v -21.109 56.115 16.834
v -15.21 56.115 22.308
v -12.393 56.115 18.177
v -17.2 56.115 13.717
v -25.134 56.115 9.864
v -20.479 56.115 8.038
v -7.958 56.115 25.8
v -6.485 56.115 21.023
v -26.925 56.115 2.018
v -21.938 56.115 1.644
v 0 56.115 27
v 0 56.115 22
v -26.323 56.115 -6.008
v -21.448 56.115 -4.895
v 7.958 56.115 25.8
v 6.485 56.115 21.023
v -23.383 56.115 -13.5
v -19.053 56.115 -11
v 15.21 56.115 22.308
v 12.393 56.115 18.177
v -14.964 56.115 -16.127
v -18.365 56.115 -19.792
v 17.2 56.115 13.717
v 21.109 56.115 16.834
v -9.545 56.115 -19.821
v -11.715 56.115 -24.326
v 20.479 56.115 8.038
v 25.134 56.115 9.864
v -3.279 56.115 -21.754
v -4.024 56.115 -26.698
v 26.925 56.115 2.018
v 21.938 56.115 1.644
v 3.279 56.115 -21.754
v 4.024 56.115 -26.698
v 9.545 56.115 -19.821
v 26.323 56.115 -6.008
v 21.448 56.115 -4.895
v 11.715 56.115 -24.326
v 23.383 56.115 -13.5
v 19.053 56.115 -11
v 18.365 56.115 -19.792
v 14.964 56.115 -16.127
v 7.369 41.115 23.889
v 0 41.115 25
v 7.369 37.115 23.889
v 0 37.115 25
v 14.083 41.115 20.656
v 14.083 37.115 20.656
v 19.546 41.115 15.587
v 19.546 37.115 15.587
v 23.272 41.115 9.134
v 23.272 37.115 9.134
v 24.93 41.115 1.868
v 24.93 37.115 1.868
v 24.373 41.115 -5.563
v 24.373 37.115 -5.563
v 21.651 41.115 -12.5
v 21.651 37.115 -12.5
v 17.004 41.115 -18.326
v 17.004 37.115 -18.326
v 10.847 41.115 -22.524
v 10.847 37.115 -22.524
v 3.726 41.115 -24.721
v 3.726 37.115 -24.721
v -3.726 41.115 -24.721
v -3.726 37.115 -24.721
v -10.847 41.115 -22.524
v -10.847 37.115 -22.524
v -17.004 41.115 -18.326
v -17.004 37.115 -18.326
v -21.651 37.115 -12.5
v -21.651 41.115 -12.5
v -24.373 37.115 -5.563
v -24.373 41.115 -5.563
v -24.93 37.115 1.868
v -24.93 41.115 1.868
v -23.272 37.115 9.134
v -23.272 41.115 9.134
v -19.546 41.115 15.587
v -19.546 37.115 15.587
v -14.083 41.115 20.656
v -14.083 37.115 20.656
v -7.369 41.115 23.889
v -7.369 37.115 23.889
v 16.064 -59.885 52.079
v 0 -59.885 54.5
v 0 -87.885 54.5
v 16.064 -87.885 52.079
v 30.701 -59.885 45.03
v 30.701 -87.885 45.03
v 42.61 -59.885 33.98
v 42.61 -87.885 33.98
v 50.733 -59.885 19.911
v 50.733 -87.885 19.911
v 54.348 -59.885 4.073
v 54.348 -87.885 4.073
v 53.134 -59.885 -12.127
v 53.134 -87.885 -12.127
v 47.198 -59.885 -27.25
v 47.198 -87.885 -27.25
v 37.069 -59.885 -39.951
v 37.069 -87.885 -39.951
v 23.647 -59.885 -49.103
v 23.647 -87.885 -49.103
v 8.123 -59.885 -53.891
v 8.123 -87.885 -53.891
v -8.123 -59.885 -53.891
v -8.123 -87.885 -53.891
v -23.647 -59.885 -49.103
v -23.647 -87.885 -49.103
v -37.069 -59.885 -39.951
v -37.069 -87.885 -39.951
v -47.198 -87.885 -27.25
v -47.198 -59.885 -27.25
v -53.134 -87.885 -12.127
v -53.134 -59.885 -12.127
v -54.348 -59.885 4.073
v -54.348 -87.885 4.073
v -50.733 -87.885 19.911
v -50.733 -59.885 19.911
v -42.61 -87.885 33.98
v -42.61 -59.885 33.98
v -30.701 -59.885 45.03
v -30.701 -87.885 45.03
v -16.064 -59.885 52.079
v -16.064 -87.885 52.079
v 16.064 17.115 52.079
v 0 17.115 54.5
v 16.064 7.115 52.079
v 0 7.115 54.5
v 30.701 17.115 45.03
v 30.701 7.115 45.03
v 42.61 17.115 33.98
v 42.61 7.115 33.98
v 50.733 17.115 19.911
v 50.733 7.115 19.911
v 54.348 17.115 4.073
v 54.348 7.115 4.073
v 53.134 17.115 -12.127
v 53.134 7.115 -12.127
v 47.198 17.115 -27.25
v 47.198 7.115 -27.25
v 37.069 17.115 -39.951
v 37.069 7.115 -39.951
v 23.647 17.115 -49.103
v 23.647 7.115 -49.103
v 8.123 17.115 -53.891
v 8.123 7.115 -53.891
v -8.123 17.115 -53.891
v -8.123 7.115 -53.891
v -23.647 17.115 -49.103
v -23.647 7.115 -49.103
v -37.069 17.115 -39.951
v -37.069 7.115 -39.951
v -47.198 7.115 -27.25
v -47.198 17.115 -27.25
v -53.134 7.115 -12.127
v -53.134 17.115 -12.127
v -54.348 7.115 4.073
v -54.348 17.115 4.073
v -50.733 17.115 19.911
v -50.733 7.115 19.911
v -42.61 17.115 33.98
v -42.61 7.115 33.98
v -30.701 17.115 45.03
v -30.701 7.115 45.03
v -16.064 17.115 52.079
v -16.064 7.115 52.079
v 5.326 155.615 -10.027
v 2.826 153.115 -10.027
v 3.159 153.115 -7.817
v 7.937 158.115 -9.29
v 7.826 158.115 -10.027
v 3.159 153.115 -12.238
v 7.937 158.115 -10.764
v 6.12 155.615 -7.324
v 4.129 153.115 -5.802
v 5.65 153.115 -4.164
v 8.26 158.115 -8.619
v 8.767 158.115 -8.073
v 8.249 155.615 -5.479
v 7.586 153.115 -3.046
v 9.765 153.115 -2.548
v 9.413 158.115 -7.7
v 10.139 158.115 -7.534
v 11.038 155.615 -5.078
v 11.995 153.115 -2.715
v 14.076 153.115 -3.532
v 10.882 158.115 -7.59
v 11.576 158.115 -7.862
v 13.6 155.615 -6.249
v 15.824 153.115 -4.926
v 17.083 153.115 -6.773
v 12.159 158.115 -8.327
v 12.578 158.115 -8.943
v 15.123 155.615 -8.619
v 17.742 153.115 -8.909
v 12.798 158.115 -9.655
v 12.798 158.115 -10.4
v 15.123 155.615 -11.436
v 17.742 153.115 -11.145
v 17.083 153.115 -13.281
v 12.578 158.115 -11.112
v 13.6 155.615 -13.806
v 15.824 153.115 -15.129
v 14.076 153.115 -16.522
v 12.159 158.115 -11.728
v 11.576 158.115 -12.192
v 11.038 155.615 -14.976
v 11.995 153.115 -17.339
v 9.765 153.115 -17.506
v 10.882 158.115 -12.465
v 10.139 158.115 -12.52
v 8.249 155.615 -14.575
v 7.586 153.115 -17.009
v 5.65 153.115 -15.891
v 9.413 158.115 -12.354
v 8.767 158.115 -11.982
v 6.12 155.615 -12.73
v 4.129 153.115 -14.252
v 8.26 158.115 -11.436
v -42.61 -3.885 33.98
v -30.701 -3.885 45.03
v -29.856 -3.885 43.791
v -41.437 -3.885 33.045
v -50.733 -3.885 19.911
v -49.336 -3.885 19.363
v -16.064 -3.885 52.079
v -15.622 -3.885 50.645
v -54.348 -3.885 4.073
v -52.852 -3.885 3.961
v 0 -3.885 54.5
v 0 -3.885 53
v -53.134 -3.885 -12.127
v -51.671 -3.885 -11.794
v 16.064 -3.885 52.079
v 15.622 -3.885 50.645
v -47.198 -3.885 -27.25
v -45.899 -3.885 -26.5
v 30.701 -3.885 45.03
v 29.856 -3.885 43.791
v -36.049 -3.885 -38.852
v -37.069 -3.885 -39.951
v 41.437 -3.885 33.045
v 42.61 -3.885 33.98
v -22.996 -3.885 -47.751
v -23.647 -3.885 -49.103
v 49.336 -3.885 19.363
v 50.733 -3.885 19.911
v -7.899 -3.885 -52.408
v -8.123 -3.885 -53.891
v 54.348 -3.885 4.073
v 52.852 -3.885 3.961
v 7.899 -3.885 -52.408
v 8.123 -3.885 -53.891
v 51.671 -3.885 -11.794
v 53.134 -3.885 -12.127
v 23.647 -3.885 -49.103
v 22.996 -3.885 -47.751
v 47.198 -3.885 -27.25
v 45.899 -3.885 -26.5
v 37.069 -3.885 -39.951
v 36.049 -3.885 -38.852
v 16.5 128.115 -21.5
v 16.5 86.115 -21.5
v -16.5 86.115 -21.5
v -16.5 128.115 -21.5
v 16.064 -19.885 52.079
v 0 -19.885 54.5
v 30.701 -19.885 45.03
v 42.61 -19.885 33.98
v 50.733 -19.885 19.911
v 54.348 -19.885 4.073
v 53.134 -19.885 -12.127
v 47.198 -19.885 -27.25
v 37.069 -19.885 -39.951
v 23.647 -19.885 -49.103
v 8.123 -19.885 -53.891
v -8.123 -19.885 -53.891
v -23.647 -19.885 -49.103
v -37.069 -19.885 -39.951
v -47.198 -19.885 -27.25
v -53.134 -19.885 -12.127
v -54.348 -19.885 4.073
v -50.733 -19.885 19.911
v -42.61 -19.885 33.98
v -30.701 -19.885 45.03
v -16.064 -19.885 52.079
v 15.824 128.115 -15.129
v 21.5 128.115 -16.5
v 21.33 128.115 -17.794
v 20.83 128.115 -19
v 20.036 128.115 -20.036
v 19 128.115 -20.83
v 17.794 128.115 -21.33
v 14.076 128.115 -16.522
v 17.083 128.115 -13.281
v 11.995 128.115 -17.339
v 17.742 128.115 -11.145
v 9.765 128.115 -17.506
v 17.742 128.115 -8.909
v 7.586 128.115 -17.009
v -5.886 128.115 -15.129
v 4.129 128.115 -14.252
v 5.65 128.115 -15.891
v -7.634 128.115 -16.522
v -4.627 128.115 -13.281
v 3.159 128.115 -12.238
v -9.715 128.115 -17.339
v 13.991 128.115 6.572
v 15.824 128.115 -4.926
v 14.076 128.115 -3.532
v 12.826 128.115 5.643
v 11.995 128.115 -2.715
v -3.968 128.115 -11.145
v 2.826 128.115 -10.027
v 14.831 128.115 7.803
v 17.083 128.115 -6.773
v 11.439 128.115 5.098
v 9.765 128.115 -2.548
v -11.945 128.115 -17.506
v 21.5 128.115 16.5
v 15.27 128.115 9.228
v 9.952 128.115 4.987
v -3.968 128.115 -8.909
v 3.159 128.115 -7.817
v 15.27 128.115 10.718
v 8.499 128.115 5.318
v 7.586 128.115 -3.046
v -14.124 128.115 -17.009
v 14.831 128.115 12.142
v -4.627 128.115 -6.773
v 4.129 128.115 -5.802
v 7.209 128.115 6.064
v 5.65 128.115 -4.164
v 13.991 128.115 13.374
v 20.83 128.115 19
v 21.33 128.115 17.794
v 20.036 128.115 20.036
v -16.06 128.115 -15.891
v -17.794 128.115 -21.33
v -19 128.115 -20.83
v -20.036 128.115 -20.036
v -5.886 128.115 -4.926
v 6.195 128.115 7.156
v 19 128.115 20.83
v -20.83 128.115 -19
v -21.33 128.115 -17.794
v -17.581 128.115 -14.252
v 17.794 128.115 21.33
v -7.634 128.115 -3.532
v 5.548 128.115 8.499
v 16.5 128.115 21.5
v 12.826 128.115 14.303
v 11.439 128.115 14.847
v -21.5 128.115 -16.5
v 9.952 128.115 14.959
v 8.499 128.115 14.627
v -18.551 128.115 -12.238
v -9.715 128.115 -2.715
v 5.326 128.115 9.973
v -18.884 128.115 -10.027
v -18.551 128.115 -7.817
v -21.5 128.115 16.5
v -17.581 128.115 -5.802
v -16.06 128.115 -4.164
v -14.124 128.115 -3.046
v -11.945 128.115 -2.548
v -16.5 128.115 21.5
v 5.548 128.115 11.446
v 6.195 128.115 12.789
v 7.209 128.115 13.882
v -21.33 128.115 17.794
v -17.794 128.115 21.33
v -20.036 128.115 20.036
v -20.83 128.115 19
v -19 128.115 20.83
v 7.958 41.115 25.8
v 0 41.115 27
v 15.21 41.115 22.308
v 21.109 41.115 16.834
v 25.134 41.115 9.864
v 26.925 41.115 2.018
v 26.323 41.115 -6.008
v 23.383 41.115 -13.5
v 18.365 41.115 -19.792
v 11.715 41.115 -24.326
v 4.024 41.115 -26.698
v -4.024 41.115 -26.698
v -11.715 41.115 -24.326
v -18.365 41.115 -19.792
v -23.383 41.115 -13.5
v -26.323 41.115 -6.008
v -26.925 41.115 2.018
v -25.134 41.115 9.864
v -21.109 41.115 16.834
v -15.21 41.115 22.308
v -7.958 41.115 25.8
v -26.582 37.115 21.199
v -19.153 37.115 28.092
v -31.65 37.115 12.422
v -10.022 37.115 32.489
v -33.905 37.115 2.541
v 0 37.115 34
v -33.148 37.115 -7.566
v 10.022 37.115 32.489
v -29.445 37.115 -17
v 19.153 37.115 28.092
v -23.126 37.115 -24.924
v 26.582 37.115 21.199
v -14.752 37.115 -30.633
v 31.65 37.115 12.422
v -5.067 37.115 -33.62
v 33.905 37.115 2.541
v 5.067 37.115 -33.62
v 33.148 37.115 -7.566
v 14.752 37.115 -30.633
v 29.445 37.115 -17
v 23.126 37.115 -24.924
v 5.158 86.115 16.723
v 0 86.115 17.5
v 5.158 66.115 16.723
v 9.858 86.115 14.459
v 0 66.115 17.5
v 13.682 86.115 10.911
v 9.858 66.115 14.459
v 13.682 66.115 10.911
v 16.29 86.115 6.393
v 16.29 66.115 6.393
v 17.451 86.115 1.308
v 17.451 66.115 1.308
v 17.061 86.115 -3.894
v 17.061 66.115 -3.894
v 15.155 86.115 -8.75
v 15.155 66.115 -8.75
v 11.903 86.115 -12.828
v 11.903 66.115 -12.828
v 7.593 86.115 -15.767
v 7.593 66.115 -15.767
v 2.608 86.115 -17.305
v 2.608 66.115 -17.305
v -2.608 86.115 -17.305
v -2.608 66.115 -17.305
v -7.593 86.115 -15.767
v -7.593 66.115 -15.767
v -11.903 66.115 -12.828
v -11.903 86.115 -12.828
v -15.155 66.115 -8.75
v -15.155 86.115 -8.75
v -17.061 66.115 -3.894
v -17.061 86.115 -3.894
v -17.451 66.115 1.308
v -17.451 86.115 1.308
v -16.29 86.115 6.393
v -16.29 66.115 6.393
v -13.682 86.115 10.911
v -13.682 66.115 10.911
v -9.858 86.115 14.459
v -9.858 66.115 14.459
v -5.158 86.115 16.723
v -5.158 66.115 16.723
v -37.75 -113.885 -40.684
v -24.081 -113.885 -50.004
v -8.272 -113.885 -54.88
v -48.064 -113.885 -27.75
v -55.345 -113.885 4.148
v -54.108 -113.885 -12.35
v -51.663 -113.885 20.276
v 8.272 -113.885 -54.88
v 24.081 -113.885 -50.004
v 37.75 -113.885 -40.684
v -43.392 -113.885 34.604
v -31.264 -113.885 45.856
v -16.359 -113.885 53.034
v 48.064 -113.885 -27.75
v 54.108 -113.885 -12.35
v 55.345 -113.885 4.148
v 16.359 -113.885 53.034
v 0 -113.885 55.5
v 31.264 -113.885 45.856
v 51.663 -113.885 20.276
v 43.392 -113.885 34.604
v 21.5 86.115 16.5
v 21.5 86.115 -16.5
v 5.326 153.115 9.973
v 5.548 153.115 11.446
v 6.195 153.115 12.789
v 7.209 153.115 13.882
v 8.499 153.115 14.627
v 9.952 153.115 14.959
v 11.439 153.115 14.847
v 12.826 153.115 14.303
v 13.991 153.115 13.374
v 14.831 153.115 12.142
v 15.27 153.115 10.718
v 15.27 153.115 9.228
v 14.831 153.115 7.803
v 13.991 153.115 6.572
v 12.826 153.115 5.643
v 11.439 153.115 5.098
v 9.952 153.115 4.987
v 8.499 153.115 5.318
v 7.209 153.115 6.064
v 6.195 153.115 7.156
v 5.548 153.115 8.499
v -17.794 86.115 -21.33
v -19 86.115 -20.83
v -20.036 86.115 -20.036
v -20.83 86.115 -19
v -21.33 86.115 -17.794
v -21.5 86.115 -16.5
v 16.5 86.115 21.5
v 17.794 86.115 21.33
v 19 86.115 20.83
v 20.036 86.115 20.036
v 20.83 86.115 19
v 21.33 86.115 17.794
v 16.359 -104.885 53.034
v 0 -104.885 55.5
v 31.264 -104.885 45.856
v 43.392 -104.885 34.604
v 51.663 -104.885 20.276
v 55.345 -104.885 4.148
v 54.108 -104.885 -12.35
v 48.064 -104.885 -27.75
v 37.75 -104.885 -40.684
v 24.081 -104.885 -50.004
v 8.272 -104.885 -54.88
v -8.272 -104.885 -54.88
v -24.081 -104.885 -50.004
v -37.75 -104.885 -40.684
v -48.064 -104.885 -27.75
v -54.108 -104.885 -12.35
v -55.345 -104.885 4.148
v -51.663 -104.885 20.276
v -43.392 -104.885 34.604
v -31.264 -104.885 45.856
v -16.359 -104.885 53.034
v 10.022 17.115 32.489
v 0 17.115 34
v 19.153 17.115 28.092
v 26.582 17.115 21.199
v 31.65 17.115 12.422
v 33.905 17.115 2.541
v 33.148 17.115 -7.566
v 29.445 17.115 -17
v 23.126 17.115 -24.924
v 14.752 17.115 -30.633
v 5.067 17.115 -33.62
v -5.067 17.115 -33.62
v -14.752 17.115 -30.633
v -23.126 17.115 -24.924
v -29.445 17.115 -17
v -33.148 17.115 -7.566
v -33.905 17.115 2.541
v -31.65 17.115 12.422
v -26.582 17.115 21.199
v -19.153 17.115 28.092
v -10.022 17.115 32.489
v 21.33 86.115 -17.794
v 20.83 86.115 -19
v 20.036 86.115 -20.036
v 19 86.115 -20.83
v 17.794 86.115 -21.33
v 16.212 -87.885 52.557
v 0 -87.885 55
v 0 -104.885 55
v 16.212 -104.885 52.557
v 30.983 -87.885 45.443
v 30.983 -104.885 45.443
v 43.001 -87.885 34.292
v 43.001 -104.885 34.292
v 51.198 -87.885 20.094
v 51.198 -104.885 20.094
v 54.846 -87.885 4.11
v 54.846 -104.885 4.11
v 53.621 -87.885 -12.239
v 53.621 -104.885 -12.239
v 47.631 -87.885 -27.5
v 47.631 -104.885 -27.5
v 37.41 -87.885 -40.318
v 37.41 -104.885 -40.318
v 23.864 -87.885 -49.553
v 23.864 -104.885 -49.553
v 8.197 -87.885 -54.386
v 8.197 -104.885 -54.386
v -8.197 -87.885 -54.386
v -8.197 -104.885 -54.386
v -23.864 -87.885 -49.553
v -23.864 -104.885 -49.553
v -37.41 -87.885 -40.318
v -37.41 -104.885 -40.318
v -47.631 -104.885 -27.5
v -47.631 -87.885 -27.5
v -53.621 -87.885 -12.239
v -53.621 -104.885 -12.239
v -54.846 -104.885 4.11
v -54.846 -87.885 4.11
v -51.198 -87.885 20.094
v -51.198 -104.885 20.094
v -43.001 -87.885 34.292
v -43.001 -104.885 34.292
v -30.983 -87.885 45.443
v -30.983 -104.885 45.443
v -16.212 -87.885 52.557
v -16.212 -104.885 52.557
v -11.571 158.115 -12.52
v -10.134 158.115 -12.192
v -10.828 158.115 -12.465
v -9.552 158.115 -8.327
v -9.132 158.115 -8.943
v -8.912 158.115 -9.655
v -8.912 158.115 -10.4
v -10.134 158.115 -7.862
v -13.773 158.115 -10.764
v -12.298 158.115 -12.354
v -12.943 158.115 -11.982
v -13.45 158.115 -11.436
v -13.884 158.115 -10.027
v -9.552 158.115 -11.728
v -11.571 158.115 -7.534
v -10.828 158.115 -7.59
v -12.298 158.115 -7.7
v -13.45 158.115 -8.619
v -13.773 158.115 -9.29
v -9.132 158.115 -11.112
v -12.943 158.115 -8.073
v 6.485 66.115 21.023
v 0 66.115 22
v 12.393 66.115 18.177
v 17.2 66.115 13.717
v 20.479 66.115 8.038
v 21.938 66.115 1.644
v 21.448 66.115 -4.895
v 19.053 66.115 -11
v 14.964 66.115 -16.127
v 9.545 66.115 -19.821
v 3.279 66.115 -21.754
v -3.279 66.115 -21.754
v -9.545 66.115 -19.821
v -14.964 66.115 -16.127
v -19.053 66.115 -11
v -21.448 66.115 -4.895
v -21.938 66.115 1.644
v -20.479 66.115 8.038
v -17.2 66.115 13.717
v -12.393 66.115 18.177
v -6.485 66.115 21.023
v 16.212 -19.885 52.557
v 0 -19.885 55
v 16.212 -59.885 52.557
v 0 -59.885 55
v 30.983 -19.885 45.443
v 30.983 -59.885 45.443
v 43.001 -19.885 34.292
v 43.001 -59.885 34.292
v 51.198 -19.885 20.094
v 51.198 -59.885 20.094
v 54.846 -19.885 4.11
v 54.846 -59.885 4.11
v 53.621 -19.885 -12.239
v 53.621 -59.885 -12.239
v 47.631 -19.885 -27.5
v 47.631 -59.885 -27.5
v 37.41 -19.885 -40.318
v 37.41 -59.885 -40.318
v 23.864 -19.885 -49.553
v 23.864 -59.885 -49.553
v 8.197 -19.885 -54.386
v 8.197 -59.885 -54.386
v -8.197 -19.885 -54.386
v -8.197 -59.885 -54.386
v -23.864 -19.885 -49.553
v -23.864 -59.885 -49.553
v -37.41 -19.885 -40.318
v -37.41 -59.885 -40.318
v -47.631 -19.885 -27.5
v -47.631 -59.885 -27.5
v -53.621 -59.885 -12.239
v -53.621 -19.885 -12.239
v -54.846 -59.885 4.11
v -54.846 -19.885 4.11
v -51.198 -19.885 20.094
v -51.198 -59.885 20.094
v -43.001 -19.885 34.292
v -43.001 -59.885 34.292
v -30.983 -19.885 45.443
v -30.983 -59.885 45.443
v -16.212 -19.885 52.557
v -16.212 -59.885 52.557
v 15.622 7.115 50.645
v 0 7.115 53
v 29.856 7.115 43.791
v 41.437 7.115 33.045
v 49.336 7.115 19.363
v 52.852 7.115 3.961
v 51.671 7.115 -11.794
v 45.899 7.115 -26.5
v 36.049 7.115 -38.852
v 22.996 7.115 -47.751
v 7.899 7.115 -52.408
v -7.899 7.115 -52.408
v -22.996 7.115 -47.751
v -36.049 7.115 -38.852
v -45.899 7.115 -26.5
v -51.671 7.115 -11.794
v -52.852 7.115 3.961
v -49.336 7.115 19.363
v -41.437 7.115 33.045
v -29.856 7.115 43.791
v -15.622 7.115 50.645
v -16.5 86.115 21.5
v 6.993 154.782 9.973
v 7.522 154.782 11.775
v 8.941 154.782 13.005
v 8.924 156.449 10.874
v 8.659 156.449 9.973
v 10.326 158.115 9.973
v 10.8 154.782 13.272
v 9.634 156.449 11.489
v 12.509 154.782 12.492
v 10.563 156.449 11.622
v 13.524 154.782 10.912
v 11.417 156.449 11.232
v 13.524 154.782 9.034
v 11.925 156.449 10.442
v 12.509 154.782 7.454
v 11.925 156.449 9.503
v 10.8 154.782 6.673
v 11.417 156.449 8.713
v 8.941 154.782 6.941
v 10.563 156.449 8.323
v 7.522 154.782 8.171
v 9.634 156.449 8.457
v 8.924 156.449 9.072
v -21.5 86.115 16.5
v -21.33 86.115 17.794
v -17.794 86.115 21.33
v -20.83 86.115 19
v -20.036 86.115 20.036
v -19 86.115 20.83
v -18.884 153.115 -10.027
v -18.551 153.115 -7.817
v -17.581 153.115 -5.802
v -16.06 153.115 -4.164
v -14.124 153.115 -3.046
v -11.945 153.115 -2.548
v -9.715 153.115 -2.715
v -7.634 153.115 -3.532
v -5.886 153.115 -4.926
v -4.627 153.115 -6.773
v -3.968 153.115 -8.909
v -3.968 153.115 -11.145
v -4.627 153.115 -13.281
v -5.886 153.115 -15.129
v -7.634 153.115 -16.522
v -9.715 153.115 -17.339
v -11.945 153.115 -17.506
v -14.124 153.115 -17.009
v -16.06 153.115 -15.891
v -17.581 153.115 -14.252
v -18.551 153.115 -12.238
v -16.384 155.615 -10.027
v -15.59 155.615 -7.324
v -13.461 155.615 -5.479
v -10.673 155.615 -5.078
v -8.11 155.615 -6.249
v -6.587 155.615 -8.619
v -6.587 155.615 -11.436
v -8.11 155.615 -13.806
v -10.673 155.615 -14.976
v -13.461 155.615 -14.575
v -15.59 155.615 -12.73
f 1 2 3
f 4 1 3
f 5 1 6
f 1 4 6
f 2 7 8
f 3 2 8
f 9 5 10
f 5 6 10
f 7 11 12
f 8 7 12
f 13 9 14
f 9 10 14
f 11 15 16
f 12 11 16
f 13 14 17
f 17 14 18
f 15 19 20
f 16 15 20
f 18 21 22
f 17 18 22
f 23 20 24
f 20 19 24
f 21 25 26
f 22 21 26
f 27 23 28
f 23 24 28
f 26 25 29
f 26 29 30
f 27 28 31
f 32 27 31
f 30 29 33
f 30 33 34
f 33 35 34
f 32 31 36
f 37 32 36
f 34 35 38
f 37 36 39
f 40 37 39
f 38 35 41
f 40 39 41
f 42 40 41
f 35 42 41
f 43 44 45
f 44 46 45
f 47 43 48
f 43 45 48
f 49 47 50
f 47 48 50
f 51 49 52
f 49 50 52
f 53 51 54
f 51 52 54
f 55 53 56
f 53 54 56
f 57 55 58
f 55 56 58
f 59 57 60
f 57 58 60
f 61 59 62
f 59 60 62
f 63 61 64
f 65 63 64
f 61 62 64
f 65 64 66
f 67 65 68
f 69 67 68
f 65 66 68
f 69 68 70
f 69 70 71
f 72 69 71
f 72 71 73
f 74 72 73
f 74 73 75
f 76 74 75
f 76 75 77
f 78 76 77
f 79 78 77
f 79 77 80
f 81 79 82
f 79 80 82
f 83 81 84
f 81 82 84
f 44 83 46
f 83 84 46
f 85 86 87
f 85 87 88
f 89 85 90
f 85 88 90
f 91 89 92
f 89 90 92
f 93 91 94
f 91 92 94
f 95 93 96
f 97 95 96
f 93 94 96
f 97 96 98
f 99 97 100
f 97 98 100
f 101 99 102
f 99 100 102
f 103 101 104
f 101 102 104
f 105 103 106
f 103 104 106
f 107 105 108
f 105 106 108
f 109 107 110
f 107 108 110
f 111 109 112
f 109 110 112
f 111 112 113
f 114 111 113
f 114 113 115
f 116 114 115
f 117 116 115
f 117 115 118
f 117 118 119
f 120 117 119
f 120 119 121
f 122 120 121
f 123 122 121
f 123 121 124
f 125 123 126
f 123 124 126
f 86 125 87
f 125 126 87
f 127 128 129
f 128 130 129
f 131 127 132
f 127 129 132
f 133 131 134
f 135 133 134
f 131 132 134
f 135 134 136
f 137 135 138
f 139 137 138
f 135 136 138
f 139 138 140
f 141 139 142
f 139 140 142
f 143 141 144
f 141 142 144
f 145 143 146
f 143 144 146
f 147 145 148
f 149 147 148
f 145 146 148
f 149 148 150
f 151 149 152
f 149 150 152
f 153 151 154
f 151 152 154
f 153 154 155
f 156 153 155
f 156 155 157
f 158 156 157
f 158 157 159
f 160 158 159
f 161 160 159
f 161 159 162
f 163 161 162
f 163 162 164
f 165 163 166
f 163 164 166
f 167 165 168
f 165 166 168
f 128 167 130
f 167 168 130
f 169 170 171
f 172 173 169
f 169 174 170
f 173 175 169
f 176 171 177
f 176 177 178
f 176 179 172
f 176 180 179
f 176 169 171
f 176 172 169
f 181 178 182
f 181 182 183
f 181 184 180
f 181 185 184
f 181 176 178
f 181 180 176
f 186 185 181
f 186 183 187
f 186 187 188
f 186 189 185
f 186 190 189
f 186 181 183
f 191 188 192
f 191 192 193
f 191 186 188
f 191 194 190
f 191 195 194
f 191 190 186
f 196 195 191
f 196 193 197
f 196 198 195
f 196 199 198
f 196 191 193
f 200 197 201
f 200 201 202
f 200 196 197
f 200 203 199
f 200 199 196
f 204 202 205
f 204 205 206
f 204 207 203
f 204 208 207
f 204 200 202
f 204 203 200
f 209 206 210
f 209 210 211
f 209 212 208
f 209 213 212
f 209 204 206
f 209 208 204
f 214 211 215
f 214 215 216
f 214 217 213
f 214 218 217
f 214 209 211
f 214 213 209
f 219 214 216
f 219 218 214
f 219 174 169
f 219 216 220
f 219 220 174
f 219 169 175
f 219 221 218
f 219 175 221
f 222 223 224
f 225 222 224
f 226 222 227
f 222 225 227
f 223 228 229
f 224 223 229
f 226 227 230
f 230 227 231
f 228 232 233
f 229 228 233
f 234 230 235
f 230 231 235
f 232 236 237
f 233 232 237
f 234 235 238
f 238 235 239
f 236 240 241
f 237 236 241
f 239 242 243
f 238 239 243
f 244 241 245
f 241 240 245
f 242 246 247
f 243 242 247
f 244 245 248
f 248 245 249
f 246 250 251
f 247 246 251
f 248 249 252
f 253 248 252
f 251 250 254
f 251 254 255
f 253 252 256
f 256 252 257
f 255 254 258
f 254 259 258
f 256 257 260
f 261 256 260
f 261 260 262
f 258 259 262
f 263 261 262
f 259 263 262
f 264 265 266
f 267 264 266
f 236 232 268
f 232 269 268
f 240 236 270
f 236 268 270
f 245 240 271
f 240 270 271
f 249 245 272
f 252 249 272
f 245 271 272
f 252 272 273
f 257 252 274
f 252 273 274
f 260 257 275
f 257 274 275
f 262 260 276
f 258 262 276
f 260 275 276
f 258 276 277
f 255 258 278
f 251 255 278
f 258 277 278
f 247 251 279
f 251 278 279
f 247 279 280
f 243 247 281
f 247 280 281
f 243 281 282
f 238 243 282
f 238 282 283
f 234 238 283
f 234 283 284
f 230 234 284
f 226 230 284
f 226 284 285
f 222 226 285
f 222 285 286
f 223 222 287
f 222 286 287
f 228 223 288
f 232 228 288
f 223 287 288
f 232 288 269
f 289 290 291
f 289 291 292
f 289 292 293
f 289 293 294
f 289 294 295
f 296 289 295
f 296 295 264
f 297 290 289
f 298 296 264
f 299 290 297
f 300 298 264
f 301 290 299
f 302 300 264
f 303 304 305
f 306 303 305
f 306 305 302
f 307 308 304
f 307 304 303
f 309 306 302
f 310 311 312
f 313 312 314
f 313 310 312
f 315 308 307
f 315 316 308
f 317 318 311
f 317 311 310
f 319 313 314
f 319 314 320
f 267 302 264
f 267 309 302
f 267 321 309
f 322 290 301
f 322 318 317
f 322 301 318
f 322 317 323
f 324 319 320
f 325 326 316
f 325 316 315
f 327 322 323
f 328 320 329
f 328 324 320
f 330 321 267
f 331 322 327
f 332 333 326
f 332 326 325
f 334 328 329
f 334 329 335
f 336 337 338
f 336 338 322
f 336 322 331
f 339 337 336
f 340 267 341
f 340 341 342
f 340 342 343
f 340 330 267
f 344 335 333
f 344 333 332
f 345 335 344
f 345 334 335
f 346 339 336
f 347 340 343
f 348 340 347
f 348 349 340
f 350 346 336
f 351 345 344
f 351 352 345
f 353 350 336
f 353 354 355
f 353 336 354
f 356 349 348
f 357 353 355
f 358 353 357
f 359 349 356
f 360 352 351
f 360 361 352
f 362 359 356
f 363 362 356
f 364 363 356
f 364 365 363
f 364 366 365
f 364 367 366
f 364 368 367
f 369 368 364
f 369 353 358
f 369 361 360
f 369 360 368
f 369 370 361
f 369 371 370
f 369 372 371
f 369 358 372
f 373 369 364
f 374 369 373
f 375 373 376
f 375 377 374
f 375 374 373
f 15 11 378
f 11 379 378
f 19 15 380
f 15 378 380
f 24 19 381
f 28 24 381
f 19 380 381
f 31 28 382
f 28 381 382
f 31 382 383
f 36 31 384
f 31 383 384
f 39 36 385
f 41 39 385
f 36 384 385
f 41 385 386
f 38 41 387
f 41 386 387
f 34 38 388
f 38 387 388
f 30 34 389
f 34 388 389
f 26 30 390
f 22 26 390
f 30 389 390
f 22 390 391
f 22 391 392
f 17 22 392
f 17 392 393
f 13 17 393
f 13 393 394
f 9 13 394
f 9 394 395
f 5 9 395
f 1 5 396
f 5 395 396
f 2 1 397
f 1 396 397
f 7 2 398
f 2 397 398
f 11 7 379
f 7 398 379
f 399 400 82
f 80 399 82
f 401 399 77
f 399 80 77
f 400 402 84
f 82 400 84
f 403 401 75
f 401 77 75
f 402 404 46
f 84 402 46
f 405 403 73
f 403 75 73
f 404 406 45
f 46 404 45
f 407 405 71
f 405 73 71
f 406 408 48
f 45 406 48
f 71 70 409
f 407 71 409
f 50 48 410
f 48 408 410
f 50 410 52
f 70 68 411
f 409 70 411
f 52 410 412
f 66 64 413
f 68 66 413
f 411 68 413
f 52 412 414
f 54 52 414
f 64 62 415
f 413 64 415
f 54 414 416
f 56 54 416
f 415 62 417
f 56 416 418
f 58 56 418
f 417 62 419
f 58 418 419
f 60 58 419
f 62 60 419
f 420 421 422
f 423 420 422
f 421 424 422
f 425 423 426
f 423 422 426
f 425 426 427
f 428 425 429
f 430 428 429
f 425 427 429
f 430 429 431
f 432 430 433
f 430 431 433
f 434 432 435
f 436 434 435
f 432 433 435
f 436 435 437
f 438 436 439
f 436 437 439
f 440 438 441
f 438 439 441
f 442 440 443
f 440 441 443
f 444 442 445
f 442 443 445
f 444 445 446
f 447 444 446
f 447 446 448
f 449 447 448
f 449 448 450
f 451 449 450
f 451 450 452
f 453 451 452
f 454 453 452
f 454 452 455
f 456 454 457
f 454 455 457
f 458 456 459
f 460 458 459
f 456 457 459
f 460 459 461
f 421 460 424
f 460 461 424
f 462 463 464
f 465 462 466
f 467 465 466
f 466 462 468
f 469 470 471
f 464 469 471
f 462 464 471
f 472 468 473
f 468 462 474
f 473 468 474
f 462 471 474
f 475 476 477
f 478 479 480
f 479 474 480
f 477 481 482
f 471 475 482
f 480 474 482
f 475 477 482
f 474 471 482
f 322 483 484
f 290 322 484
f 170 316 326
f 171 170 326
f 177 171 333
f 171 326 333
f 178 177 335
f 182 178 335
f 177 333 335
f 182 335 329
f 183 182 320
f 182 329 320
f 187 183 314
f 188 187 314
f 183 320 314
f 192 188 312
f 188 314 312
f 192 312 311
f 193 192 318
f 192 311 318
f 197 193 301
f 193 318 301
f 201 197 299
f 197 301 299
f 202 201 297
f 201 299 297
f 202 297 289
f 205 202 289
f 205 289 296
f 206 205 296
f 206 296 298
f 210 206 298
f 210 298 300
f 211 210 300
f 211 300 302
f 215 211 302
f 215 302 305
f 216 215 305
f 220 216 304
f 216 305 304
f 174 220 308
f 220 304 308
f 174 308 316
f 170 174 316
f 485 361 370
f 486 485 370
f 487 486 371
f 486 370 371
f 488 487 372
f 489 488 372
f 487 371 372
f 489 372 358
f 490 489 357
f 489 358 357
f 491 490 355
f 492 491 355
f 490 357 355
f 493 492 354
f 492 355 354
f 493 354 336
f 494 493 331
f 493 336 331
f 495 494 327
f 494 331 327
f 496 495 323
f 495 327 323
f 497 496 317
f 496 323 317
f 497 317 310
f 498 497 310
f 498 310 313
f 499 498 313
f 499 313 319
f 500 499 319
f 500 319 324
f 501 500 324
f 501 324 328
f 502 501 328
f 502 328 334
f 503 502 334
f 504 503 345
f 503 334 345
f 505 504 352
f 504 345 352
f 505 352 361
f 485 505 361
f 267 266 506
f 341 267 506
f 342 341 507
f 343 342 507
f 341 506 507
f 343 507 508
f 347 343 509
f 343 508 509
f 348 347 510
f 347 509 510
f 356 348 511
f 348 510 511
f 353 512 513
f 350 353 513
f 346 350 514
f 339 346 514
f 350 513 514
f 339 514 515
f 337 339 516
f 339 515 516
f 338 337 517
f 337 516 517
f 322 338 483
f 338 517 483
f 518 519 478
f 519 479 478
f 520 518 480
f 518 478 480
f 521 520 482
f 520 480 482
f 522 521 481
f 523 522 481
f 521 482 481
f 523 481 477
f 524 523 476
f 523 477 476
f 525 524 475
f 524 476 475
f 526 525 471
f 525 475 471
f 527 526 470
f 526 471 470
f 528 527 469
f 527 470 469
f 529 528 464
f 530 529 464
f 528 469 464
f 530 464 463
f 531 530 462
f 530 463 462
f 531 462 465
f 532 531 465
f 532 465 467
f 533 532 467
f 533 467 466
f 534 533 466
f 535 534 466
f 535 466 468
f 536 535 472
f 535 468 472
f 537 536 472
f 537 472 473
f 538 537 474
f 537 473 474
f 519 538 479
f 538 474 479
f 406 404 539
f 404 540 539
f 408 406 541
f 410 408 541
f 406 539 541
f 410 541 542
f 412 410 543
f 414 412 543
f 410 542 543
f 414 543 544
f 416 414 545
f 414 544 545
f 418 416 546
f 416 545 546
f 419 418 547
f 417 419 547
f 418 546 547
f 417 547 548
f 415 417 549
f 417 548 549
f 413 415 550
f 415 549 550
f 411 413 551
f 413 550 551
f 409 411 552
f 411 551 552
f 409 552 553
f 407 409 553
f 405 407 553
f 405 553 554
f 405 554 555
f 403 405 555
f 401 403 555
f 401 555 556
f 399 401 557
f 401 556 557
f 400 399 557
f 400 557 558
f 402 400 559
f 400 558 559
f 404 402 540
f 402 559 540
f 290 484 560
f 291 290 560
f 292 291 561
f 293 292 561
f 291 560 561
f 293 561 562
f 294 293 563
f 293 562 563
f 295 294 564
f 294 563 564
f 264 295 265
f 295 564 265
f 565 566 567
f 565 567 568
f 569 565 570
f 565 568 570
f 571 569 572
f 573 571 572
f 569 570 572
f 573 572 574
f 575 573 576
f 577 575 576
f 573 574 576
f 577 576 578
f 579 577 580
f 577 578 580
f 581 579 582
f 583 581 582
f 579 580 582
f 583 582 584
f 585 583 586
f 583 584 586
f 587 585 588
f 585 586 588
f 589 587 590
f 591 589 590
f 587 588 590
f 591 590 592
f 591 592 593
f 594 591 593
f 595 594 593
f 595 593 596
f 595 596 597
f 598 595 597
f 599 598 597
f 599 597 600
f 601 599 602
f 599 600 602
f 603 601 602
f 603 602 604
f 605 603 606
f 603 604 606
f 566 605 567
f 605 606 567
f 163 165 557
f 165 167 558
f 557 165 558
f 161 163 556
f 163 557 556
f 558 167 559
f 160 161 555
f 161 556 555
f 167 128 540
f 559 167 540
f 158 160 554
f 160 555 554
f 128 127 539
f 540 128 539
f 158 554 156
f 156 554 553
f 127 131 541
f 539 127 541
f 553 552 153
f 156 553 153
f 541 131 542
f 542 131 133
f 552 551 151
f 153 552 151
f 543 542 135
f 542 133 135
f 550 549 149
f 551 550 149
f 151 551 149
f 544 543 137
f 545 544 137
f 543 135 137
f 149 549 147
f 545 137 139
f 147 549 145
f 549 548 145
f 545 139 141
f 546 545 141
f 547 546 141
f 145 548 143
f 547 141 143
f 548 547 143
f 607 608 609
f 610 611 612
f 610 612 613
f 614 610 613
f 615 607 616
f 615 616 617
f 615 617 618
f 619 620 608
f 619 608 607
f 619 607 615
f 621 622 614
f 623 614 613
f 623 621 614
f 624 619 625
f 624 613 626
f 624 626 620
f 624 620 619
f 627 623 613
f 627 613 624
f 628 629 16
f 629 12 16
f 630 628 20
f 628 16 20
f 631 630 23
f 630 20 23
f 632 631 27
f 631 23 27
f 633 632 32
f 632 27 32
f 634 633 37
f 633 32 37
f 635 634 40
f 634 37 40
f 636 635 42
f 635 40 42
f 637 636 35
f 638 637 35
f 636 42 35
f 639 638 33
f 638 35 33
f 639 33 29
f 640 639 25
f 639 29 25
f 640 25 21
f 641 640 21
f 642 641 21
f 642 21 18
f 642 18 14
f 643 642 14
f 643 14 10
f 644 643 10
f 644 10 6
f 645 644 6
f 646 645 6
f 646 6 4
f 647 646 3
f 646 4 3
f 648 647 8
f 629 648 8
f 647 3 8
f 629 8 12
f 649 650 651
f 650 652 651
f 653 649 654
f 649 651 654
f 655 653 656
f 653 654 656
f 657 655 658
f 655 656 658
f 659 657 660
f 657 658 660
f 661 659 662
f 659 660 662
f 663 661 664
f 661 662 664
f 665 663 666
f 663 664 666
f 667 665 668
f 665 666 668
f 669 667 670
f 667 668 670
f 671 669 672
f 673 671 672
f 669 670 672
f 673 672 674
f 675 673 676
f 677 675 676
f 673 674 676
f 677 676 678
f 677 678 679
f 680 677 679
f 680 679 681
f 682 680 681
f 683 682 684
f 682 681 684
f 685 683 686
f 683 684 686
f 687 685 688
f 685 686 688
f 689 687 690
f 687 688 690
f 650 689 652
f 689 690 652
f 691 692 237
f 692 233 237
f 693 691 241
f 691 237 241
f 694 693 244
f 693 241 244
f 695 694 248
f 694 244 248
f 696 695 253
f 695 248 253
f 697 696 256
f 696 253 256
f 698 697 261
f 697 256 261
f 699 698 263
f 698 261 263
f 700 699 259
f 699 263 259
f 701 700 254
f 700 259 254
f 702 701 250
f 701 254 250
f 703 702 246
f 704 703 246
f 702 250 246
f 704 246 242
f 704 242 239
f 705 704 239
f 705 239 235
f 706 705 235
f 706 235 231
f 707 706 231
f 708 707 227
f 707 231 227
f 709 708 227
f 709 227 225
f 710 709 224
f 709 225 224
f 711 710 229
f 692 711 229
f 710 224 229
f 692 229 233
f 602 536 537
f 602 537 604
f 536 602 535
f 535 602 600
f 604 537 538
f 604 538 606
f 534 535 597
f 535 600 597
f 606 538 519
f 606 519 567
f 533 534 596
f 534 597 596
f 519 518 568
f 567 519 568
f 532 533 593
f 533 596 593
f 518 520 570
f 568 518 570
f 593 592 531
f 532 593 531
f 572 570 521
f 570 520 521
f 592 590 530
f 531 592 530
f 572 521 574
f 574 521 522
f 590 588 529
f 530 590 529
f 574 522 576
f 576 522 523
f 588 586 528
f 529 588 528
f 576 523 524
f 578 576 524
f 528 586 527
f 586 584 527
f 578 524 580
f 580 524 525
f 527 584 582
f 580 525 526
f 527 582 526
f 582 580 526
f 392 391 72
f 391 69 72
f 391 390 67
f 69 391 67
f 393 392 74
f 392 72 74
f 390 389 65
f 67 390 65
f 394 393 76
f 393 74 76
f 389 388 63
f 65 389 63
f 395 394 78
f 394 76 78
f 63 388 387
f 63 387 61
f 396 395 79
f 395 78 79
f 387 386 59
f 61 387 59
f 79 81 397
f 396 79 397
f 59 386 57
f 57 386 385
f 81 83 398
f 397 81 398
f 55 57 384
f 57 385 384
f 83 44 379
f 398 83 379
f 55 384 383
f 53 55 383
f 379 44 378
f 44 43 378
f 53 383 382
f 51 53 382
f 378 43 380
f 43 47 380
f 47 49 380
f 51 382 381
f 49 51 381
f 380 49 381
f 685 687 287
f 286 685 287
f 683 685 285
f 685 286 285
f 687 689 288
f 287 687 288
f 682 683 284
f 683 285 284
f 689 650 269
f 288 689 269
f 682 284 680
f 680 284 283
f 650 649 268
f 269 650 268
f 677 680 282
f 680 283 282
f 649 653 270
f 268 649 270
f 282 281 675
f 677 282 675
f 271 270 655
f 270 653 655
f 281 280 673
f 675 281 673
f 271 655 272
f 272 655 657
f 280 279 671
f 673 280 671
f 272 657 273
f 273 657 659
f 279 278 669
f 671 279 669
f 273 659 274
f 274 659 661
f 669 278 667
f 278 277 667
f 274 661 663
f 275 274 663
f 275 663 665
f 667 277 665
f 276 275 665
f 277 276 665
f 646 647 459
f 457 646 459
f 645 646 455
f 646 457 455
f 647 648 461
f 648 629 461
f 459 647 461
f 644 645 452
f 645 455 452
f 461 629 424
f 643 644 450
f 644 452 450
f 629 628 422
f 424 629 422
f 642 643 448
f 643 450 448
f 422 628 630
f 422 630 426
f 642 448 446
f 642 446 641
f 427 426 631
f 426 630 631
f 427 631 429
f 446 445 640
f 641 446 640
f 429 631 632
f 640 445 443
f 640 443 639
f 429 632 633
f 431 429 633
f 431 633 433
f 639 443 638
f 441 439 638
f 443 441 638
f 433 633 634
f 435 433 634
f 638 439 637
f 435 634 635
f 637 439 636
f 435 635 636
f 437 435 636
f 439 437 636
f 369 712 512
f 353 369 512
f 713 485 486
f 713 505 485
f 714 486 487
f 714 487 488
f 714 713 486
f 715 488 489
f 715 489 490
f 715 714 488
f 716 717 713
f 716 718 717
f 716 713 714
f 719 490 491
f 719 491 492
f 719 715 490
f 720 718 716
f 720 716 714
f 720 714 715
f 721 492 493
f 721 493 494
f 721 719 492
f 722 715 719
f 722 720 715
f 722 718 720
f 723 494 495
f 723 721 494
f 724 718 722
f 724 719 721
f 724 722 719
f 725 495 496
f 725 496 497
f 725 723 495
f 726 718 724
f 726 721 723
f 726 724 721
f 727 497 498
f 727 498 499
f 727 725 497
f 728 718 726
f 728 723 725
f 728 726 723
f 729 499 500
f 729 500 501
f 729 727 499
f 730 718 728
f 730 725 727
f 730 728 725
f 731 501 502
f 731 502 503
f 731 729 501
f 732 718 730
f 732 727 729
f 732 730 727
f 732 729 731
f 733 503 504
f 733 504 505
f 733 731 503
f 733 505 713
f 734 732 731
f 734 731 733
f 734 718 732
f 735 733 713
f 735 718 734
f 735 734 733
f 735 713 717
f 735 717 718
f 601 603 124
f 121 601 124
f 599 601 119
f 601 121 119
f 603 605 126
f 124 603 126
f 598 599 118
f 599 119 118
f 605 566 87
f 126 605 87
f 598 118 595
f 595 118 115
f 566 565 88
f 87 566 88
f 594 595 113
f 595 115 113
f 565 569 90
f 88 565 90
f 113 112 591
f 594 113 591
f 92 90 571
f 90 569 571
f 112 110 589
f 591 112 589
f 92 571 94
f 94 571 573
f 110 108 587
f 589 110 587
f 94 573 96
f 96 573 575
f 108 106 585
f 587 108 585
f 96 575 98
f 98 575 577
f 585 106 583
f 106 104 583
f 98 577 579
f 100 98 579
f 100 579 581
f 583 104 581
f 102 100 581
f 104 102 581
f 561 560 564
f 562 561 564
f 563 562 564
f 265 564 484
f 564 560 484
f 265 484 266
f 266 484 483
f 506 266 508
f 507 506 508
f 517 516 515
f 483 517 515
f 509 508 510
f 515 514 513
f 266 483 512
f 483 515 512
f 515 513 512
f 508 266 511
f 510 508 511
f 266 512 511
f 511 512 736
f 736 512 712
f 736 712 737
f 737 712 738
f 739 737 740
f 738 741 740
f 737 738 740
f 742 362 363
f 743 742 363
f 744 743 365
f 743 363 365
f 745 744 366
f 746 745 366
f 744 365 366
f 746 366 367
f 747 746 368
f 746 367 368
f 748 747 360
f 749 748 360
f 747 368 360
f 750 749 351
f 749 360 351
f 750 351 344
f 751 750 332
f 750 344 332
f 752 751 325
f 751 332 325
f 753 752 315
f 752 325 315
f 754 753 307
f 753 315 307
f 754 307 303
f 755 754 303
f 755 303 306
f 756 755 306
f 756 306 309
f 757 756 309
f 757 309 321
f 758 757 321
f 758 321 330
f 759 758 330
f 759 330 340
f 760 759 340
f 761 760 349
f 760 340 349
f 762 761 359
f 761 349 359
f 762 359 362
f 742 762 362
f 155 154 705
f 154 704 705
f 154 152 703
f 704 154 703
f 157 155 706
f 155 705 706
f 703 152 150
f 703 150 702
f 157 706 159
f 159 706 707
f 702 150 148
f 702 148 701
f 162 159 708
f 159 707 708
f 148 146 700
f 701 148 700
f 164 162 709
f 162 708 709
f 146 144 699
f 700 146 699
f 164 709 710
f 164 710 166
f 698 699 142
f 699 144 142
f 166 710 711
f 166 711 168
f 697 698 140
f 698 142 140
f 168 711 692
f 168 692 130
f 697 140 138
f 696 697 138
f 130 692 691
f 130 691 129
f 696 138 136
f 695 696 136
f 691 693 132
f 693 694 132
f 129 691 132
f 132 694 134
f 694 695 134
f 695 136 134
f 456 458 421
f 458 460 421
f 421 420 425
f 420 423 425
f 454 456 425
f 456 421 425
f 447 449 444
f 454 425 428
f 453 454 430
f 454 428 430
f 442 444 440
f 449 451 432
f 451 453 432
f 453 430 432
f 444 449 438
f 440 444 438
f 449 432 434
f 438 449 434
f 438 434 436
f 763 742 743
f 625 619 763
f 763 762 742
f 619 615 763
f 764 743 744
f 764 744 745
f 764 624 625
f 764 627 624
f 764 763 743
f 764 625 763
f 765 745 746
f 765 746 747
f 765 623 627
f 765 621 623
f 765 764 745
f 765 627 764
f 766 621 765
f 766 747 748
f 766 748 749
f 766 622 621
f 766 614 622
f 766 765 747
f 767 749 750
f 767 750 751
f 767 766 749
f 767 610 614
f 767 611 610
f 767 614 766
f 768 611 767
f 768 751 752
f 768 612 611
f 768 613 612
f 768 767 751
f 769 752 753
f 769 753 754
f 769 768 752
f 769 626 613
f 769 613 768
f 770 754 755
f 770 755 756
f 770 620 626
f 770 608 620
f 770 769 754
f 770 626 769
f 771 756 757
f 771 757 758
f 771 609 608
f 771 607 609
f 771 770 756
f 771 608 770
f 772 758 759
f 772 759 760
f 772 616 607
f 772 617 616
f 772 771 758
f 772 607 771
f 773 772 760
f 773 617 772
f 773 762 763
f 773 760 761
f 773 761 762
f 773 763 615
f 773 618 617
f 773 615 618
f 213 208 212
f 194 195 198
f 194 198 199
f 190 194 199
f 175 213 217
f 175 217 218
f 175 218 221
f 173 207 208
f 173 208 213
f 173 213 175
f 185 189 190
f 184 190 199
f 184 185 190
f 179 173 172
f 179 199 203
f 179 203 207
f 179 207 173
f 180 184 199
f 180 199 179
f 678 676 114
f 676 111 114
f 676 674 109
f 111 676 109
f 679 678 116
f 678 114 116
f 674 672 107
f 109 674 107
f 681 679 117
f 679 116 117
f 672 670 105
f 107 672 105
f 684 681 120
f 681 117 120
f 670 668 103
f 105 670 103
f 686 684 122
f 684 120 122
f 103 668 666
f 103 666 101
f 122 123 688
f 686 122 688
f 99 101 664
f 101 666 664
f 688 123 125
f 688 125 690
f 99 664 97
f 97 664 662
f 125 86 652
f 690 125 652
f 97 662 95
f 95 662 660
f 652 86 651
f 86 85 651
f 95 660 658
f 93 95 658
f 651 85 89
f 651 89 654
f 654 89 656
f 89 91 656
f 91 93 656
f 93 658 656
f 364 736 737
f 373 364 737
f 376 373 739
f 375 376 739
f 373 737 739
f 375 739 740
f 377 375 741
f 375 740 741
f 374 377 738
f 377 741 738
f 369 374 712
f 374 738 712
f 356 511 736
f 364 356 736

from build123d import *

# Parameters (mm, degrees)
F2_R     = 17.5
F3_DEPTH = 42
F4_R     = 5
F4_R_2   = 7.5
F5_DEPTH = 30
F6_SIZE  = 5


with BuildPart() as f1:
    # F0 (on Right) → F1 (revolve)
    with BuildSketch(Plane.YZ):
        Polygon((-113.8845806535, 55.5), (-113.8845806535, 0), (86.1154193465, 0), (86.1154193465, 17.5), (66.1154193465, 17.5), (66.1154193465, 22), (56.1154193465, 22), (56.1154193465, 27), (41.1154193465, 27), (41.1154193465, 25), (37.1154193465, 25), (37.1154193465, 34), (17.1154193465, 34), (17.1154193465, 54.5), (7.1154193465, 54.5), (7.1154193465, 53), (-3.8845806535, 53), (-3.8845806535, 54.5), (-19.8845806535, 54.5), (-19.8845806535, 55), (-59.8845806535, 55), (-59.8845806535, 54.5), (-87.8845806535, 54.5), (-87.8845806535, 55), (-104.8845806535, 55), (-104.8845806535, 55.5), align=None)
    revolve(axis=Axis((0, -10.2711766958, 0), (0, 1, 0)))


with BuildPart() as f3:
    # F2 (on face) → F3 (new body)
    with BuildSketch(Plane(origin=(0, 86.1154193465, 0), x_dir=(-1, 0, 0), z_dir=(0, 1, 0))):
        with BuildLine():
            Line((16.5, 21.5), (-16.5, 21.5))
            ThreePointArc((-16.5, 21.5), (-20.0355339059, 20.0355339059), (-21.5, 16.5))
            Line((-21.5, 16.5), (-21.5, -16.5))
            ThreePointArc((-21.5, -16.5), (-20.0355339059, -20.0355339059), (-16.5, -21.5))
            Line((-16.5, -21.5), (16.5, -21.5))
            ThreePointArc((16.5, -21.5), (20.0355339059, -20.0355339059), (21.5, -16.5))
            Line((21.5, -16.5), (21.5, 16.5))
            ThreePointArc((21.5, 16.5), (20.0355339059, 20.0355339059), (16.5, 21.5))
        make_face()
        Circle(F2_R, mode=Mode.SUBTRACT)
        Circle(F2_R)
    extrude(amount=F3_DEPTH)

    # F4 (on face) → F5 (join)
    with BuildSketch(Plane(origin=(0, 128.1154193465, 0), x_dir=(-1, 0, 0), z_dir=(0, 1, 0))):
        with Locations((-10.3259523134, 9.9727134464)):
            Circle(F4_R)
        with Locations((-10.3259523134, -10.0272865536)):
            Circle(F4_R_2)
        with Locations((11.3842158583, -10.0272865536)):
            Circle(F4_R_2)
    extrude(amount=F5_DEPTH)

    # F6
    f6_edges = [f3.edges().sort_by_distance(p)[0] for p in [
        (-3.884216, 158.115419, -10.027287),
        (17.825952, 158.115419, -10.027287),
        (15.325952, 158.115419, 9.972713),
    ]]
    chamfer(f6_edges, length=F6_SIZE)


solid = Compound([f1.part, f3.part])
